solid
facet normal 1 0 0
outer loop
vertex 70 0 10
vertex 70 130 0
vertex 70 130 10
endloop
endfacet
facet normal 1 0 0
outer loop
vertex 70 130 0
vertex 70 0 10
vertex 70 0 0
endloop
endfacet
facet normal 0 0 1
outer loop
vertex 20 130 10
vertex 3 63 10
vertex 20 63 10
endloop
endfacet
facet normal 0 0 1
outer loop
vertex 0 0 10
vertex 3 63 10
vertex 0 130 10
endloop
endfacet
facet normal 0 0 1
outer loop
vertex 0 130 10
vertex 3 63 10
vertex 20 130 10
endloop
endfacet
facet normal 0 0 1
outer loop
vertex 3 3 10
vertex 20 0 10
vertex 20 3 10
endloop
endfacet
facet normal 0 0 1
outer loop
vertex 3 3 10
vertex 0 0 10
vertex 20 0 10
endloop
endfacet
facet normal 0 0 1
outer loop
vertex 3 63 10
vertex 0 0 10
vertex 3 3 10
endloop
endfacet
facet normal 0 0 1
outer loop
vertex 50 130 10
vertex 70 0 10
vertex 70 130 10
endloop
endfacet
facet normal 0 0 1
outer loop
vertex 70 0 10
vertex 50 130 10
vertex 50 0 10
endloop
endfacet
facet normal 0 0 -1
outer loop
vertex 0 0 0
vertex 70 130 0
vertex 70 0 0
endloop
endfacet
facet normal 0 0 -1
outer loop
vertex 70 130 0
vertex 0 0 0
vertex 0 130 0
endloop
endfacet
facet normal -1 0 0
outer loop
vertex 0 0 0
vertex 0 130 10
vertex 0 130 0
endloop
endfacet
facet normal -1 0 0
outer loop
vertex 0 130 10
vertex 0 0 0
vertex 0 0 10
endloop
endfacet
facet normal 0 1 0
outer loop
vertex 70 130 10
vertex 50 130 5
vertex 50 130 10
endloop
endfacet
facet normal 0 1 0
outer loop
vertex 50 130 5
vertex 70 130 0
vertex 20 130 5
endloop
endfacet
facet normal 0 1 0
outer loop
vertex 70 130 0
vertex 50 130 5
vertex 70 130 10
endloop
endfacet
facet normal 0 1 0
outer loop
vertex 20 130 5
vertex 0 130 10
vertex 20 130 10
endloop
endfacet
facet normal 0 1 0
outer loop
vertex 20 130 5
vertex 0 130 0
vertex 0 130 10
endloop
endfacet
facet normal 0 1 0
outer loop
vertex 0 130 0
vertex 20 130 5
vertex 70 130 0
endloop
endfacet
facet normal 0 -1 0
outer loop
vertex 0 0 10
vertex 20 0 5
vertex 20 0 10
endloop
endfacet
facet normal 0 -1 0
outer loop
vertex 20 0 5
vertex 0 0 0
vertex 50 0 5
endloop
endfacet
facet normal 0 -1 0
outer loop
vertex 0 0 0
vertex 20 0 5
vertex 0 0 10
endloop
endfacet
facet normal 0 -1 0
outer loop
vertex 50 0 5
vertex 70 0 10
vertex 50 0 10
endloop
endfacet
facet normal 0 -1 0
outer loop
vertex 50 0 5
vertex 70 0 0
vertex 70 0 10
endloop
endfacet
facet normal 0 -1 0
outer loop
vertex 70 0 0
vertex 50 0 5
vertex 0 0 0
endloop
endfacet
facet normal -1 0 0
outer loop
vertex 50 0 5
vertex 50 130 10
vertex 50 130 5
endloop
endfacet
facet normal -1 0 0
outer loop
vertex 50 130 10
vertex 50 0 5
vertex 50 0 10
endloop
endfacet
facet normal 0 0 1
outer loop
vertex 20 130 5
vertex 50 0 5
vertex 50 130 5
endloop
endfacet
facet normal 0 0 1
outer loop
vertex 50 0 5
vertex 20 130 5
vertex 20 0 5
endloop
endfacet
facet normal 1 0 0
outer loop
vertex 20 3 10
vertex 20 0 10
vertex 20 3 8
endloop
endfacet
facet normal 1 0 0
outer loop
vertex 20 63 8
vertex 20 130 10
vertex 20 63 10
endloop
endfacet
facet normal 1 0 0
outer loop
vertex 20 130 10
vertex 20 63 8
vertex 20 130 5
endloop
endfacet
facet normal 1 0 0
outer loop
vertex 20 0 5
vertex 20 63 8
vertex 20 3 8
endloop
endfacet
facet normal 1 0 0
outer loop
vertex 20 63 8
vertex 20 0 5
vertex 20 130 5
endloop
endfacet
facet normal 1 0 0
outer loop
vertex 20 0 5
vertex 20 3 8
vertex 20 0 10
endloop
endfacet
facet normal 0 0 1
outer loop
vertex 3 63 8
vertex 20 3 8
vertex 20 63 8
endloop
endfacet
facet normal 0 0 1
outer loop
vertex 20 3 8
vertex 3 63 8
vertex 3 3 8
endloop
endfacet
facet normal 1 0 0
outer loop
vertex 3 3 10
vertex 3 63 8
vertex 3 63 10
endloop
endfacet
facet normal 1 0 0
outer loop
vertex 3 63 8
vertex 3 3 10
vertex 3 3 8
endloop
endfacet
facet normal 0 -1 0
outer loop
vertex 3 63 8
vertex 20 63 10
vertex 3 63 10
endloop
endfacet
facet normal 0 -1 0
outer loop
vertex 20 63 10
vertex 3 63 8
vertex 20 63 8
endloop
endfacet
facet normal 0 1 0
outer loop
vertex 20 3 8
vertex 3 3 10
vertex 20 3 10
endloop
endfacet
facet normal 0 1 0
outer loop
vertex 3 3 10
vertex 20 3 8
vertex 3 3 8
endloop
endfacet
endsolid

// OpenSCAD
difference()
{
  cube([70,130,10]);
  translate([20,-1,5]) cube([30,140,10]);
  translate([3,3,8]) cube([22,60,10]);
}
